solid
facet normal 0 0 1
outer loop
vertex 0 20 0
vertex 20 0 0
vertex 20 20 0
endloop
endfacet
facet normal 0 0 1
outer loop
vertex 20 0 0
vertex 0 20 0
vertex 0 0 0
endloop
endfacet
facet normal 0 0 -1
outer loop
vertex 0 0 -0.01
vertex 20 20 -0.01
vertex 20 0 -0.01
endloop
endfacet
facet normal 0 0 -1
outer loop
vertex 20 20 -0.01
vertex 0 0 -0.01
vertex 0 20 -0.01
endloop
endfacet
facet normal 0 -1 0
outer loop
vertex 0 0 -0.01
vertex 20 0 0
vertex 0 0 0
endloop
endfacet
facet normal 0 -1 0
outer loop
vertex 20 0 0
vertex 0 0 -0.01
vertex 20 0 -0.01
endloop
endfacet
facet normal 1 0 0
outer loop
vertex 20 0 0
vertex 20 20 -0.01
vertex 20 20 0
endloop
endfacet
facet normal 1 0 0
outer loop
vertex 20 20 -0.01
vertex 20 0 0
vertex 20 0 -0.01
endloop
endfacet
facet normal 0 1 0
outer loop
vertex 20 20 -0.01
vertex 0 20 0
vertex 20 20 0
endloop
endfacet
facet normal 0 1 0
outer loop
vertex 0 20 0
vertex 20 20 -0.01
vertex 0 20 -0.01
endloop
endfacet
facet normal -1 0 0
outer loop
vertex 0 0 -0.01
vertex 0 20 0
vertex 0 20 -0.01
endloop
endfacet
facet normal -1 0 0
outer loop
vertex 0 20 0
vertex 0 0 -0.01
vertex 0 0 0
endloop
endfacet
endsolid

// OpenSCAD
translate([0,0,-0.01]) color([0.1,0.1,0.1]) cube([20,20,0.01]);
